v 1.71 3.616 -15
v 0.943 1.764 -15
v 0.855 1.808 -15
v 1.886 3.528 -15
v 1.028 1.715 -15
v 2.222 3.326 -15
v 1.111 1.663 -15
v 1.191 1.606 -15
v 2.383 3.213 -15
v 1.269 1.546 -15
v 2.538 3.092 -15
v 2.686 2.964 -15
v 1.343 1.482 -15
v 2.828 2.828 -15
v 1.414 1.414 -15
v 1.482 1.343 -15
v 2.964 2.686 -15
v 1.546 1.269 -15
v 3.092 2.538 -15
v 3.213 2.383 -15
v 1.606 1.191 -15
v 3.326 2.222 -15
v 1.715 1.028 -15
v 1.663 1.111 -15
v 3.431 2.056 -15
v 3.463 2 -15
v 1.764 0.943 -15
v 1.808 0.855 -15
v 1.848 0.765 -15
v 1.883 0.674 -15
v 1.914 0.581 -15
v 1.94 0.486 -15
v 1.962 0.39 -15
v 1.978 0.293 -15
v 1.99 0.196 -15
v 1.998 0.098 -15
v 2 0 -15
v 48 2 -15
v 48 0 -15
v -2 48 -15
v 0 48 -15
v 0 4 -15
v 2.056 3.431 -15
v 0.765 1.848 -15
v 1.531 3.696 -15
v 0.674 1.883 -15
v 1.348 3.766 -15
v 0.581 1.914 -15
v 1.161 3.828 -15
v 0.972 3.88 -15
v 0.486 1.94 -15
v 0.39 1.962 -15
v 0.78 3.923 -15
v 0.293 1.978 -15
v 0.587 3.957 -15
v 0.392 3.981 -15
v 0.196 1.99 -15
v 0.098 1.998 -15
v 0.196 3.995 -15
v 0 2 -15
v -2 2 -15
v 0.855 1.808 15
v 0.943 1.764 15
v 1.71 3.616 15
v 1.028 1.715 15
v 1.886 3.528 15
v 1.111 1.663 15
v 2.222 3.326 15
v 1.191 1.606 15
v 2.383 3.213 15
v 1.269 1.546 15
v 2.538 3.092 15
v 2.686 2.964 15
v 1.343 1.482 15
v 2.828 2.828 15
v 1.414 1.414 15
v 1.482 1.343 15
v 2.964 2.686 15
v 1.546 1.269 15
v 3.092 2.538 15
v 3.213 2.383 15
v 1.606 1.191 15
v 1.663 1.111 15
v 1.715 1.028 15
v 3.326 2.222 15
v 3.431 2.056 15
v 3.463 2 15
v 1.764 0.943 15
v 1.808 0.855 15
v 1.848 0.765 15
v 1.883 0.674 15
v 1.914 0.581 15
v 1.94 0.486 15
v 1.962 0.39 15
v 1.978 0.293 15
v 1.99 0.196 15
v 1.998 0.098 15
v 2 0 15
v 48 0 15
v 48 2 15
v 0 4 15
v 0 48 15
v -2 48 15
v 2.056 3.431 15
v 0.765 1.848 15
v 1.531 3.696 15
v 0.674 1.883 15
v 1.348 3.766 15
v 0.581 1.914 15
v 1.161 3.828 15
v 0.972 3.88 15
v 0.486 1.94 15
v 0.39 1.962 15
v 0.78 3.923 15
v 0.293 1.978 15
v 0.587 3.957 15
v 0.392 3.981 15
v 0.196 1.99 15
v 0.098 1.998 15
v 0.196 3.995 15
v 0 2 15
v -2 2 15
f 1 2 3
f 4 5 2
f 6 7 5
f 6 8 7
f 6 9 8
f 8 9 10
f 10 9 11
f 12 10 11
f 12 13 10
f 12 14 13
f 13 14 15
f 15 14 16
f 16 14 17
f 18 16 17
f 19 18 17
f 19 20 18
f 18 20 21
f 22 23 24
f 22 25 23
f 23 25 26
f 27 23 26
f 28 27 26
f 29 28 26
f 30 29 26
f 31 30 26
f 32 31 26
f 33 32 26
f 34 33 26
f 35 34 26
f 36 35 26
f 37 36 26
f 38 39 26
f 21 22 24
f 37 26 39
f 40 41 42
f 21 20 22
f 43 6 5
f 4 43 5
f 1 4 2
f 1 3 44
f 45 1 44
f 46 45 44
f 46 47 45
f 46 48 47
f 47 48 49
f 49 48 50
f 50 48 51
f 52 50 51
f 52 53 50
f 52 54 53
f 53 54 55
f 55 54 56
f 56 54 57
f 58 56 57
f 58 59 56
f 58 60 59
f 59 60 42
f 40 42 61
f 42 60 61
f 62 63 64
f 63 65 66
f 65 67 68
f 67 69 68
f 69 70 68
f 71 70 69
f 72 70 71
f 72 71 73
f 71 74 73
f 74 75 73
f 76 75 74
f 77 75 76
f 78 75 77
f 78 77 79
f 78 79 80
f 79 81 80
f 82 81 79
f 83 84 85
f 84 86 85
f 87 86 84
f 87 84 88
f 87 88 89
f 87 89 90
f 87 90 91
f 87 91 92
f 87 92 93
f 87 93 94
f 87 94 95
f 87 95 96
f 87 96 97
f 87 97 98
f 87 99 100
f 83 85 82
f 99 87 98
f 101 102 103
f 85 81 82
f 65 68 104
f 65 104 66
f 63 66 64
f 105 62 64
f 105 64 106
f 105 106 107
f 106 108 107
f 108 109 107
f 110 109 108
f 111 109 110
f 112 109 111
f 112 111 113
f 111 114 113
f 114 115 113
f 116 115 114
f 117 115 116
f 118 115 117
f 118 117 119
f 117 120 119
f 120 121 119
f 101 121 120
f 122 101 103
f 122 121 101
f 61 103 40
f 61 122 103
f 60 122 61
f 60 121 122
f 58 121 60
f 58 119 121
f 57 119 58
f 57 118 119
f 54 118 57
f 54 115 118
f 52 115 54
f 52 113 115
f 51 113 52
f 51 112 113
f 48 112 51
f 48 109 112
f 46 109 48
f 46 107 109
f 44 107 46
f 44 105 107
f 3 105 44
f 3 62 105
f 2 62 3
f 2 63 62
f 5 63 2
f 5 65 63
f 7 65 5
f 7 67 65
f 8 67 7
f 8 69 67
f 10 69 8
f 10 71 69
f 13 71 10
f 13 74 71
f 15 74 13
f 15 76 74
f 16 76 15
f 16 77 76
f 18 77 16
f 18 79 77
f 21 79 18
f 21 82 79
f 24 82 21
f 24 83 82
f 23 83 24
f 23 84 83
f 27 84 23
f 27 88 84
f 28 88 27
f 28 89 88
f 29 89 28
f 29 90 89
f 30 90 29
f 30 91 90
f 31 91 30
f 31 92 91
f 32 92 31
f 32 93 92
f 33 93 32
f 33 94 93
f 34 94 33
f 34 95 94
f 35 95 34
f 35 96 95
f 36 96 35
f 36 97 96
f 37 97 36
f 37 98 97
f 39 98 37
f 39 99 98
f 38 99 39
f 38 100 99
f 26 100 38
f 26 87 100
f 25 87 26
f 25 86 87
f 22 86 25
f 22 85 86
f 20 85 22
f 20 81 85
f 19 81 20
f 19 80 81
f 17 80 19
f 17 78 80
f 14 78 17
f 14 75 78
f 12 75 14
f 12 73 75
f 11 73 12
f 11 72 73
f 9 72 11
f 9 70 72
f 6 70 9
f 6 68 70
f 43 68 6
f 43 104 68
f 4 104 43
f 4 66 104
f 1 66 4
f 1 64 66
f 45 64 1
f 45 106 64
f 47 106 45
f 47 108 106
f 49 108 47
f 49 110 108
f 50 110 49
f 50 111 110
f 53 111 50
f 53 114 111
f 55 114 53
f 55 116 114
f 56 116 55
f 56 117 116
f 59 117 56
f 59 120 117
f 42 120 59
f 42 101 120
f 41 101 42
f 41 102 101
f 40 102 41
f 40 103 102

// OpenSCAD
// Units: mm
$fn = 128;

thickness_mm = 2.0;
bend_radius_mm = 2.0;
k_factor = 0.45;
bend_angle_deg = 90.0;

flange_a_outside_mm = 50.0;
flange_b_outside_mm = 50.0;
width_mm = 30.0;

outside_setback_mm = (bend_radius_mm + thickness_mm) * tan(bend_angle_deg / 2);
bend_allowance_mm = (PI / 180) * bend_angle_deg * (bend_radius_mm + k_factor * thickness_mm);
developed_flat_length_mm =
    (flange_a_outside_mm - outside_setback_mm) +
    (flange_b_outside_mm - outside_setback_mm) +
    bend_allowance_mm;

echo(str(
    "MAKERBENCH-SHEETMETAL: {",
    "\"thickness_mm\":", thickness_mm, ",",
    "\"bend_radius_mm\":", bend_radius_mm, ",",
    "\"developed_flat_length_mm\":", developed_flat_length_mm,
    "}"
));

module formed_l_bracket() {
    ri = bend_radius_mm;
    ro = bend_radius_mm + thickness_mm;
    leg_a = flange_a_outside_mm - outside_setback_mm;
    leg_b = flange_b_outside_mm - outside_setback_mm;

    linear_extrude(height = width_mm, center = true, convexity = 10)
        union() {
            polygon(points = [
                [ri, 0],
                [ri + leg_a, 0],
                [ri + leg_a, thickness_mm],
                [ri, thickness_mm]
            ]);

            polygon(points = [
                [-thickness_mm, ri],
                [0, ri],
                [0, ri + leg_b],
                [-thickness_mm, ri + leg_b]
            ]);

            difference() {
                circle(r = ro);
                circle(r = ri);
                polygon(points = [
                    [-ro - 1, -ro - 1],
                    [ ro + 1, -ro - 1],
                    [ ro + 1, 0],
                    [0, 0],
                    [0, ro + 1],
                    [-ro - 1, ro + 1]
                ]);
            }
        }
}

formed_l_bracket();
